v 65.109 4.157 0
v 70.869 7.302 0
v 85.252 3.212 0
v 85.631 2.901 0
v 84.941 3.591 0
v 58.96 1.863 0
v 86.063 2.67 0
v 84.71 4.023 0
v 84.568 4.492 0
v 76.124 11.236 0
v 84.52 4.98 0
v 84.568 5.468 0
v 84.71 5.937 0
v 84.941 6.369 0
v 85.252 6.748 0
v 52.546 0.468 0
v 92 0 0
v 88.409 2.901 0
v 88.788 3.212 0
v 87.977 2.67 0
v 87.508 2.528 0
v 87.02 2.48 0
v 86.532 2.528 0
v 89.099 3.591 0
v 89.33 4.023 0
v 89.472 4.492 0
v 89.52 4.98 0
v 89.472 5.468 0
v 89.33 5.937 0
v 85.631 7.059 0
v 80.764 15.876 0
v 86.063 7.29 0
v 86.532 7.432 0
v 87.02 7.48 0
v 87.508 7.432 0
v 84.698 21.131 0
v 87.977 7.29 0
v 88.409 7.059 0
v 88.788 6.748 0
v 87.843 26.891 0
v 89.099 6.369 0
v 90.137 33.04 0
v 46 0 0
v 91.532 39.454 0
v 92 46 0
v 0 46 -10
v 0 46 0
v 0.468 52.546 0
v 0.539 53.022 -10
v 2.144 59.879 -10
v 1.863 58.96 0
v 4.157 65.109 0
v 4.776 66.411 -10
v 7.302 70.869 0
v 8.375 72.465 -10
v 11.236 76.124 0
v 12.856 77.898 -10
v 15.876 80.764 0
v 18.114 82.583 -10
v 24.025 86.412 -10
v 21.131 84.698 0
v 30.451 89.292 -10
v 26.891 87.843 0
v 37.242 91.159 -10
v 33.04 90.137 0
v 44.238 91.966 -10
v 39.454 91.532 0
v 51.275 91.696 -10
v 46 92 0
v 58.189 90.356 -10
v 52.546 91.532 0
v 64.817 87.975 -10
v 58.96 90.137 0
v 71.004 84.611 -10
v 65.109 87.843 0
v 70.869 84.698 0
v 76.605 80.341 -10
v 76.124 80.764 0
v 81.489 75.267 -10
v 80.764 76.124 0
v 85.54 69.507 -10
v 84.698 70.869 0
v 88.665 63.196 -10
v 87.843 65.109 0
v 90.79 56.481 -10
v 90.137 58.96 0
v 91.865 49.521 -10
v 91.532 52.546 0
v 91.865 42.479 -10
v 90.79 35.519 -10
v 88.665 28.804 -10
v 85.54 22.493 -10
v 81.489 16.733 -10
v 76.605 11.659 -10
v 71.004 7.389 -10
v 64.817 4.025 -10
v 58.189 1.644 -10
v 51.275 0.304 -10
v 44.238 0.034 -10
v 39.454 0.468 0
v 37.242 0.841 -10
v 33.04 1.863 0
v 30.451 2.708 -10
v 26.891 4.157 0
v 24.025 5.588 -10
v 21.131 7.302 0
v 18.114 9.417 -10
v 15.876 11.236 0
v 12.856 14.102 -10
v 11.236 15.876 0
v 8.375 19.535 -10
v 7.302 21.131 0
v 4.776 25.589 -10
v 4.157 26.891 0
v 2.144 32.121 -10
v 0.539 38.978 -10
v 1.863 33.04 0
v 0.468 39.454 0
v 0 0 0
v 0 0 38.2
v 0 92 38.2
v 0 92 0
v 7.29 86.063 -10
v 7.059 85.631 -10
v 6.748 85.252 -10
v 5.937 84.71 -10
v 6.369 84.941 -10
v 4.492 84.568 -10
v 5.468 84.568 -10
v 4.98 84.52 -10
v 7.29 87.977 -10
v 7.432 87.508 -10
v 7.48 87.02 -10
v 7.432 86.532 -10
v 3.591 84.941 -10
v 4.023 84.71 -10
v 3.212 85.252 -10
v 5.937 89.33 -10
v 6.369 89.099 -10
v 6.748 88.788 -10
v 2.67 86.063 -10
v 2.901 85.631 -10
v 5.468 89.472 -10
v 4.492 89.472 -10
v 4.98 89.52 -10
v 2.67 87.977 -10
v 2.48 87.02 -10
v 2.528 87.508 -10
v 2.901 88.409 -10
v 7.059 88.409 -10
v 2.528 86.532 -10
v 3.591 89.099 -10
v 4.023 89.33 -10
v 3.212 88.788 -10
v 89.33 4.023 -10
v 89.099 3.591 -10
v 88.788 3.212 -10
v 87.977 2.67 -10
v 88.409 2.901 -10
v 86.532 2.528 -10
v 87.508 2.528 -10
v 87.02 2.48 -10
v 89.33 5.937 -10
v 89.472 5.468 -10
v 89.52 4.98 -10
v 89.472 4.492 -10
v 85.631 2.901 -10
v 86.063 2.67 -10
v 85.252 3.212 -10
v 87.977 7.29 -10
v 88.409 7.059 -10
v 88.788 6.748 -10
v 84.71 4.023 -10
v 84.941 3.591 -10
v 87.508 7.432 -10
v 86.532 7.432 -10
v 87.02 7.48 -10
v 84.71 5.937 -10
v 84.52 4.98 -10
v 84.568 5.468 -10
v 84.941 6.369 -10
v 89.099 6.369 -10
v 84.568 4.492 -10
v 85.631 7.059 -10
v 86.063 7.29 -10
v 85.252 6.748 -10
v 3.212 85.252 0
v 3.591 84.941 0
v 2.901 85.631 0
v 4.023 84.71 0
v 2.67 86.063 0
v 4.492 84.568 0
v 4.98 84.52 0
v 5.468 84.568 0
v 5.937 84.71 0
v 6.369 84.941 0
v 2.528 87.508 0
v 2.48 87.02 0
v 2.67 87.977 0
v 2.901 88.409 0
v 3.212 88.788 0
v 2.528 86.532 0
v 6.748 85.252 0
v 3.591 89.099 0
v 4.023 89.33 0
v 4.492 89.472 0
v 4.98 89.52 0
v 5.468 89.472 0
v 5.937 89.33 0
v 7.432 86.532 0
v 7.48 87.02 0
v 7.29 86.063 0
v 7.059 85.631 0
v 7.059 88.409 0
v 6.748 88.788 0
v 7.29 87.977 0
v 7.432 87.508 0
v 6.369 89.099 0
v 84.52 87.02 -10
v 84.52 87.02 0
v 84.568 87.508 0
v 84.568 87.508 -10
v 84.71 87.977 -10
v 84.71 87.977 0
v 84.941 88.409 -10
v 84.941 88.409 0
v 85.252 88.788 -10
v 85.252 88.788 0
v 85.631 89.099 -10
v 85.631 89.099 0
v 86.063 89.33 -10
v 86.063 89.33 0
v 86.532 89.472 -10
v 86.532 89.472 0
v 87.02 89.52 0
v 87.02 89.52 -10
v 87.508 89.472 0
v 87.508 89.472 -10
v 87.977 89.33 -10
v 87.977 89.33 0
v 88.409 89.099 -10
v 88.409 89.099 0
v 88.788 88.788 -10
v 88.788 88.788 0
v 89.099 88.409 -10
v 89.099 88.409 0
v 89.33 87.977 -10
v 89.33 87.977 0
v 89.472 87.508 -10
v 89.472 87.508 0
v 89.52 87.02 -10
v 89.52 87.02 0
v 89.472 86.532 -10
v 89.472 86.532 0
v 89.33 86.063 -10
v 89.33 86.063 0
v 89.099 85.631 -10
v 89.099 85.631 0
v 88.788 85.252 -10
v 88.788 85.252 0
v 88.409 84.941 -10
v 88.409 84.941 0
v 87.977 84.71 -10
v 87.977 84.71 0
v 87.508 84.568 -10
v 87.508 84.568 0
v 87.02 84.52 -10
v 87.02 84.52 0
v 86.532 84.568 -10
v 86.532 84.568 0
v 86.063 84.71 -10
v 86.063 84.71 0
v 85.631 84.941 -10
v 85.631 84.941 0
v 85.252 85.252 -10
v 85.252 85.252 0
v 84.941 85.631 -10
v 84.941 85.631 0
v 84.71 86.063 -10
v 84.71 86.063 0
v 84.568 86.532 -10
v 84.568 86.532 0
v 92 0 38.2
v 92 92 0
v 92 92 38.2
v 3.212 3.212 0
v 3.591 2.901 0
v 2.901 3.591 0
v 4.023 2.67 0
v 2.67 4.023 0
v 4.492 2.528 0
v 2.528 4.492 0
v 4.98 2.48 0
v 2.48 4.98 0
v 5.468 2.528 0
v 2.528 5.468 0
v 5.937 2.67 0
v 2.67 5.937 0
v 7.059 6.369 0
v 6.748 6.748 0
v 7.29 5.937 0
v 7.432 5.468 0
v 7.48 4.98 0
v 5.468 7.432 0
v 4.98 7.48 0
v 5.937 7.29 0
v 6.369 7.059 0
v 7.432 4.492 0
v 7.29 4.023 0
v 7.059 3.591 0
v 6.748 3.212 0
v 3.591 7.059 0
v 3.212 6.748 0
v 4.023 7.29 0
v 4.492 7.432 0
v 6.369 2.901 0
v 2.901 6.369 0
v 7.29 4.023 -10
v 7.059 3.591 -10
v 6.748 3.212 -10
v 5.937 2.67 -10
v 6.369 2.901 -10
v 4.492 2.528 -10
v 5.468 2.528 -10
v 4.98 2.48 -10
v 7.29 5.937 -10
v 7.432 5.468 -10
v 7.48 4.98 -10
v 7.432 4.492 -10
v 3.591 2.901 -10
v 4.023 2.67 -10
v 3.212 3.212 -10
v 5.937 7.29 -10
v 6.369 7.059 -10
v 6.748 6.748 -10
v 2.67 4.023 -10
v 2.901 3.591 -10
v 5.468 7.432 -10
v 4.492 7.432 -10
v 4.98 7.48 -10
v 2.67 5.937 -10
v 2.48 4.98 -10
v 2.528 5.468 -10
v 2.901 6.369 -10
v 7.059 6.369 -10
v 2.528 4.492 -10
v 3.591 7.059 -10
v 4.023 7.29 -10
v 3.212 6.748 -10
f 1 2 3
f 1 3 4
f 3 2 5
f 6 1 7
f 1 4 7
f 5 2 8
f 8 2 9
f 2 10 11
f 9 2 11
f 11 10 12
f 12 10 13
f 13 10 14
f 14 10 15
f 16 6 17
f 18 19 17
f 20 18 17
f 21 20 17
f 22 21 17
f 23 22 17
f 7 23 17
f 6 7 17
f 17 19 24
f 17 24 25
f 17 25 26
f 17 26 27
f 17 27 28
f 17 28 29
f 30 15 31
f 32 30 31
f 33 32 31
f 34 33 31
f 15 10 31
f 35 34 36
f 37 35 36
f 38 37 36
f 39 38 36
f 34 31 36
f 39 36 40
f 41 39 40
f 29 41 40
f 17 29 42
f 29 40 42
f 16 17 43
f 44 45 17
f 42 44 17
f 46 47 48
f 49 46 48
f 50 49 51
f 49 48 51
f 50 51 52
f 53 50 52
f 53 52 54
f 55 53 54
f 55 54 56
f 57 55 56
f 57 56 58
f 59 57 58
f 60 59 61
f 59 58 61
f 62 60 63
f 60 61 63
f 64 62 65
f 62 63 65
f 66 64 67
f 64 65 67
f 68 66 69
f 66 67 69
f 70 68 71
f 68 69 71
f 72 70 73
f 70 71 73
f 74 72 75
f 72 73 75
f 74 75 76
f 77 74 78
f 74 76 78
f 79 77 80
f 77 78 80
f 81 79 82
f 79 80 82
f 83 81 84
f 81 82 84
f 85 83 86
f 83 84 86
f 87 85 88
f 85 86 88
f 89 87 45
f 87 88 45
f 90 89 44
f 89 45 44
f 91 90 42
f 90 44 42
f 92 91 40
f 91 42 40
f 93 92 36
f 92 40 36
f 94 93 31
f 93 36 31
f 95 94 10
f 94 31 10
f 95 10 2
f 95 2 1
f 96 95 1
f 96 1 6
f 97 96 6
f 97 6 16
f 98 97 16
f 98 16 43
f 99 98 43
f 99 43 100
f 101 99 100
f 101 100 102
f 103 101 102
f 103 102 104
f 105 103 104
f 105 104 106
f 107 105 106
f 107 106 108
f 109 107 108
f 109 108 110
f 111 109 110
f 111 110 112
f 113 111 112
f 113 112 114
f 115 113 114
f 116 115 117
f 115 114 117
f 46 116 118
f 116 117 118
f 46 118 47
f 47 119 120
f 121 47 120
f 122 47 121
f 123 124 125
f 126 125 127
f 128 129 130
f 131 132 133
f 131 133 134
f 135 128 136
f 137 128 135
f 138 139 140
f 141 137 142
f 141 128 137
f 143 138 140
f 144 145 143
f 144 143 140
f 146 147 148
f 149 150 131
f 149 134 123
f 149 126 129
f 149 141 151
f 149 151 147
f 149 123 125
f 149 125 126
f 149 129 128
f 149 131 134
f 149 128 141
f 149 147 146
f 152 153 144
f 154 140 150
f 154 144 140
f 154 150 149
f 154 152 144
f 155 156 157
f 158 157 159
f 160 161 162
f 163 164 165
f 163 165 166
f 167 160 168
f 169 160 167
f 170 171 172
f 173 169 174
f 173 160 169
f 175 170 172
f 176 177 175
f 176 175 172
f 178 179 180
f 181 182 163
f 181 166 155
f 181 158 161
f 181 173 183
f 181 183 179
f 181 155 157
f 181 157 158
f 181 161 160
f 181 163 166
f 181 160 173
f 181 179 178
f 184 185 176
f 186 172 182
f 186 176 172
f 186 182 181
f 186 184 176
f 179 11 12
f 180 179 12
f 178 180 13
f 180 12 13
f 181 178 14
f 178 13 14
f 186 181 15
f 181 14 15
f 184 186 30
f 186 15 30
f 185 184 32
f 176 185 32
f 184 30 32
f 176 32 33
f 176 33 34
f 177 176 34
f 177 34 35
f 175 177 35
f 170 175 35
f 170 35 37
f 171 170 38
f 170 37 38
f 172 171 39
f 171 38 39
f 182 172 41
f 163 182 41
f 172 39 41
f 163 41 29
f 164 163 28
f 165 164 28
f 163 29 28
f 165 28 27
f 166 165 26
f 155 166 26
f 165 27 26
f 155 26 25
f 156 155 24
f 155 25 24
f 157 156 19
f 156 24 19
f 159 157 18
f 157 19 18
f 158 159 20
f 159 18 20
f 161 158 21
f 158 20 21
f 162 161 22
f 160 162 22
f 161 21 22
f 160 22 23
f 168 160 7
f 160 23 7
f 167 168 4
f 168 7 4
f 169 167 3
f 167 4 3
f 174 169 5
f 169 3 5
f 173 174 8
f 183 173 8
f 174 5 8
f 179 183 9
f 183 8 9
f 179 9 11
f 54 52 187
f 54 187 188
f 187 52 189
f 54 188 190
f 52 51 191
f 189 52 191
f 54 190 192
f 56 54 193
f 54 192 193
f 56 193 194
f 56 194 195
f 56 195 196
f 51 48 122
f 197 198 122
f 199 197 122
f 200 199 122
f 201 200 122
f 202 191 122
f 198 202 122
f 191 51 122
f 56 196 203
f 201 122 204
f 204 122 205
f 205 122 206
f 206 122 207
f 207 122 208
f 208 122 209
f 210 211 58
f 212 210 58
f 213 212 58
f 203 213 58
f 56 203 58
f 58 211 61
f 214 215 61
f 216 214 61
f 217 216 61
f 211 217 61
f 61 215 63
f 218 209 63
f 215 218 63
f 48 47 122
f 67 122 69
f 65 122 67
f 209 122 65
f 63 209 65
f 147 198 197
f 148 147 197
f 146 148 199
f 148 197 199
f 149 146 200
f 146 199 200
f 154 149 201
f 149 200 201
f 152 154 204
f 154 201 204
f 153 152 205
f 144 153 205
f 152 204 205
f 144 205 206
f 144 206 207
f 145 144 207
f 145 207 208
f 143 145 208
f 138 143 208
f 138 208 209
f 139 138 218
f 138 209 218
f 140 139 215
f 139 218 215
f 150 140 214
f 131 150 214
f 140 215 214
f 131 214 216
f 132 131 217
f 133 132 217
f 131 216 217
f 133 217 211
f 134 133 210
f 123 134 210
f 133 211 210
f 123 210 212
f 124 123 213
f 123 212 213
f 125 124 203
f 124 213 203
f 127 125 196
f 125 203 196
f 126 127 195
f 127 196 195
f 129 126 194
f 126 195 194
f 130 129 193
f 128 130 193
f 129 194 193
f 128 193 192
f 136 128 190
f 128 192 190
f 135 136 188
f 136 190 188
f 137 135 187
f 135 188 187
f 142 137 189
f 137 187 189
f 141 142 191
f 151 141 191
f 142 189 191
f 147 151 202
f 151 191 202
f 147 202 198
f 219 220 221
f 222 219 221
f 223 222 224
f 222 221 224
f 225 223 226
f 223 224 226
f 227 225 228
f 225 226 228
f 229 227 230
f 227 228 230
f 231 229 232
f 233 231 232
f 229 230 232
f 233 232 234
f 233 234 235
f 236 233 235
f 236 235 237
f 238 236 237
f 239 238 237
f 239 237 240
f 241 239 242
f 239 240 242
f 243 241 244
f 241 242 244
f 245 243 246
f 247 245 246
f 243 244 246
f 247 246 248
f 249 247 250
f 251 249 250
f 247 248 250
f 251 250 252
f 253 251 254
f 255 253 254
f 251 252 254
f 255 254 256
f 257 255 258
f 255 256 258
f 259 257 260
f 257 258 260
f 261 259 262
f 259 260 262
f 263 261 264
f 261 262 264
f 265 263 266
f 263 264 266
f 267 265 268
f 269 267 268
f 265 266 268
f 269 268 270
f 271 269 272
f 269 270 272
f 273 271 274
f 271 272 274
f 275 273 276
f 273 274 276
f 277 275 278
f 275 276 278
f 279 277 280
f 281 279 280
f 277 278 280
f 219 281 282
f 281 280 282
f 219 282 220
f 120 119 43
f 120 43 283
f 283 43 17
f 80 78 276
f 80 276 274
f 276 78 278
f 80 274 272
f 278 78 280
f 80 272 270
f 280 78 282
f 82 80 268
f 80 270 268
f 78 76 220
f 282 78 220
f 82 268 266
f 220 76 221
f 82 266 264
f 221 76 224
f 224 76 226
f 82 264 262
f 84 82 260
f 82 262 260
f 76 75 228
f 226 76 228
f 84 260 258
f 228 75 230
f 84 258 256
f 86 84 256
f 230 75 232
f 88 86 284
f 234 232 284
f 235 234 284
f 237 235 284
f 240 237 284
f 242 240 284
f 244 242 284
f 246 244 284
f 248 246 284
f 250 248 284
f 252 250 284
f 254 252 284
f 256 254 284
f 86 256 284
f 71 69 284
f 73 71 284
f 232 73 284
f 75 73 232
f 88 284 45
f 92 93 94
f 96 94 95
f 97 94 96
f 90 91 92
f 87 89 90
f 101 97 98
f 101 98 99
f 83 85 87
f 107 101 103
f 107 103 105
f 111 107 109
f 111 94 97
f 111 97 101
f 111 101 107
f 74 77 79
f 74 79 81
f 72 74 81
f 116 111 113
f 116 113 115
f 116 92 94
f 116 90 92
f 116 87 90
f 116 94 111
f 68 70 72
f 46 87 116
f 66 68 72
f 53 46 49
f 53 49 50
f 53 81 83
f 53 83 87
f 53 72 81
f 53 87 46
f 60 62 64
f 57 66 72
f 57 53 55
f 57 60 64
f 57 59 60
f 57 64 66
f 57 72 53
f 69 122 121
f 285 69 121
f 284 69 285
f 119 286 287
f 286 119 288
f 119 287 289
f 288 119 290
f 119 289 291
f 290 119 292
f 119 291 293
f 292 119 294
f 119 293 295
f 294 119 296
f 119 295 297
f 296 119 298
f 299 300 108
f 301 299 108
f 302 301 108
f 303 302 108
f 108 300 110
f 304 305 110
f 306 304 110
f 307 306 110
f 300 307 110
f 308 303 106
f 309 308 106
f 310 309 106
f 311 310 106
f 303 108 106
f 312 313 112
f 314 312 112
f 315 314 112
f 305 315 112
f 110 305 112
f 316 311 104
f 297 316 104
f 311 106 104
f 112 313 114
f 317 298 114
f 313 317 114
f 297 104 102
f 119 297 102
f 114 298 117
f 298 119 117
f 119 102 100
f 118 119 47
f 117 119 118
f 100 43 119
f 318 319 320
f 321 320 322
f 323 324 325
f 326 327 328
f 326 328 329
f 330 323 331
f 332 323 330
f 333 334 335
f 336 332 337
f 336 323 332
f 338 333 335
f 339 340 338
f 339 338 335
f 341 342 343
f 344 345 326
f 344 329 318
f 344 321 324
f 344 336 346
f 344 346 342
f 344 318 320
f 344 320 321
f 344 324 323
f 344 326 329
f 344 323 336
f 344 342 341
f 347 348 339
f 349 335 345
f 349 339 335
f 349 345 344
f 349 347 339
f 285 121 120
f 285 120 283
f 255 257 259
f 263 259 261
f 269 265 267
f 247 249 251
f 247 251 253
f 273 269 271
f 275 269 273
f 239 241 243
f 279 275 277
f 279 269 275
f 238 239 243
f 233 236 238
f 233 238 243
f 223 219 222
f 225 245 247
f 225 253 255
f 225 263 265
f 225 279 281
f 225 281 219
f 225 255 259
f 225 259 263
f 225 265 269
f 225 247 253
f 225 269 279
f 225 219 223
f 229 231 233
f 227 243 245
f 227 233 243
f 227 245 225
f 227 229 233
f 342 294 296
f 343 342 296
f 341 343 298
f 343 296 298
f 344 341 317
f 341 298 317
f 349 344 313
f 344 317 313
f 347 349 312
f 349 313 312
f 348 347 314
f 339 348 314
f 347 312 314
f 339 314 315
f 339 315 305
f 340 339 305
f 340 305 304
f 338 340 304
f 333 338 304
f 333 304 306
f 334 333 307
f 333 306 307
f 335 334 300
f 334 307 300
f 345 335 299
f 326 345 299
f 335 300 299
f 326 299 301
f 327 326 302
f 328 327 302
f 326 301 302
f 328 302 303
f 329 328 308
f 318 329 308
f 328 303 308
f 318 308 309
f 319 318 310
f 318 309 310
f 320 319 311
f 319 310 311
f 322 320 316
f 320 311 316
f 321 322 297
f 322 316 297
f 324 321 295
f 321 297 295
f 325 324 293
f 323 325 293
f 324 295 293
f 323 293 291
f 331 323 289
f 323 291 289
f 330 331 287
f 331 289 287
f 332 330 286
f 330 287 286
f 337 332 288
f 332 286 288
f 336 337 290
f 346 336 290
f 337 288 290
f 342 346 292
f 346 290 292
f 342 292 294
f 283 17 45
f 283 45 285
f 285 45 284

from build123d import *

# Parameters (mm, degrees)
SKETCH2_W           = 92
SKETCH2_H           = 92
BOSS_EXTRUDE1_DEPTH = 38.2
SKETCH3_R           = 2.5
BOSS_EXTRUDE2_DEPTH = 10
SKETCH4_R           = 46
BOSS_EXTRUDE3_DEPTH = 10


with BuildPart() as part:
    # Sketch2 → Boss-Extrude1 (new body)
    with BuildSketch(Plane.XY):
        with Locations((46, 46)):
            Rectangle(SKETCH2_W, SKETCH2_H)
    extrude(amount=BOSS_EXTRUDE1_DEPTH)

    # Sketch3 → Boss-Extrude2 (add)
    with BuildSketch(Plane(origin=(0, 0, 0), x_dir=(-1, 0, 0), z_dir=(0, 0, -1))):
        with Locations((-4.98, 4.98)):
            Circle(SKETCH3_R)
        with Locations((-87.02, 4.98)):
            Circle(SKETCH3_R)
        with Locations((-87.02, 87.02)):
            Circle(SKETCH3_R)
        with Locations((-4.98, 87.02)):
            Circle(SKETCH3_R)
    extrude(amount=BOSS_EXTRUDE2_DEPTH)

    # Sketch4 → Boss-Extrude3 (add)
    with BuildSketch(Plane(origin=(0, 0, 0), x_dir=(-1, 0, 0), z_dir=(0, 0, -1))):
        with Locations((-46, 46)):
            Circle(SKETCH4_R)
    extrude(amount=BOSS_EXTRUDE3_DEPTH)


solid = part.part
